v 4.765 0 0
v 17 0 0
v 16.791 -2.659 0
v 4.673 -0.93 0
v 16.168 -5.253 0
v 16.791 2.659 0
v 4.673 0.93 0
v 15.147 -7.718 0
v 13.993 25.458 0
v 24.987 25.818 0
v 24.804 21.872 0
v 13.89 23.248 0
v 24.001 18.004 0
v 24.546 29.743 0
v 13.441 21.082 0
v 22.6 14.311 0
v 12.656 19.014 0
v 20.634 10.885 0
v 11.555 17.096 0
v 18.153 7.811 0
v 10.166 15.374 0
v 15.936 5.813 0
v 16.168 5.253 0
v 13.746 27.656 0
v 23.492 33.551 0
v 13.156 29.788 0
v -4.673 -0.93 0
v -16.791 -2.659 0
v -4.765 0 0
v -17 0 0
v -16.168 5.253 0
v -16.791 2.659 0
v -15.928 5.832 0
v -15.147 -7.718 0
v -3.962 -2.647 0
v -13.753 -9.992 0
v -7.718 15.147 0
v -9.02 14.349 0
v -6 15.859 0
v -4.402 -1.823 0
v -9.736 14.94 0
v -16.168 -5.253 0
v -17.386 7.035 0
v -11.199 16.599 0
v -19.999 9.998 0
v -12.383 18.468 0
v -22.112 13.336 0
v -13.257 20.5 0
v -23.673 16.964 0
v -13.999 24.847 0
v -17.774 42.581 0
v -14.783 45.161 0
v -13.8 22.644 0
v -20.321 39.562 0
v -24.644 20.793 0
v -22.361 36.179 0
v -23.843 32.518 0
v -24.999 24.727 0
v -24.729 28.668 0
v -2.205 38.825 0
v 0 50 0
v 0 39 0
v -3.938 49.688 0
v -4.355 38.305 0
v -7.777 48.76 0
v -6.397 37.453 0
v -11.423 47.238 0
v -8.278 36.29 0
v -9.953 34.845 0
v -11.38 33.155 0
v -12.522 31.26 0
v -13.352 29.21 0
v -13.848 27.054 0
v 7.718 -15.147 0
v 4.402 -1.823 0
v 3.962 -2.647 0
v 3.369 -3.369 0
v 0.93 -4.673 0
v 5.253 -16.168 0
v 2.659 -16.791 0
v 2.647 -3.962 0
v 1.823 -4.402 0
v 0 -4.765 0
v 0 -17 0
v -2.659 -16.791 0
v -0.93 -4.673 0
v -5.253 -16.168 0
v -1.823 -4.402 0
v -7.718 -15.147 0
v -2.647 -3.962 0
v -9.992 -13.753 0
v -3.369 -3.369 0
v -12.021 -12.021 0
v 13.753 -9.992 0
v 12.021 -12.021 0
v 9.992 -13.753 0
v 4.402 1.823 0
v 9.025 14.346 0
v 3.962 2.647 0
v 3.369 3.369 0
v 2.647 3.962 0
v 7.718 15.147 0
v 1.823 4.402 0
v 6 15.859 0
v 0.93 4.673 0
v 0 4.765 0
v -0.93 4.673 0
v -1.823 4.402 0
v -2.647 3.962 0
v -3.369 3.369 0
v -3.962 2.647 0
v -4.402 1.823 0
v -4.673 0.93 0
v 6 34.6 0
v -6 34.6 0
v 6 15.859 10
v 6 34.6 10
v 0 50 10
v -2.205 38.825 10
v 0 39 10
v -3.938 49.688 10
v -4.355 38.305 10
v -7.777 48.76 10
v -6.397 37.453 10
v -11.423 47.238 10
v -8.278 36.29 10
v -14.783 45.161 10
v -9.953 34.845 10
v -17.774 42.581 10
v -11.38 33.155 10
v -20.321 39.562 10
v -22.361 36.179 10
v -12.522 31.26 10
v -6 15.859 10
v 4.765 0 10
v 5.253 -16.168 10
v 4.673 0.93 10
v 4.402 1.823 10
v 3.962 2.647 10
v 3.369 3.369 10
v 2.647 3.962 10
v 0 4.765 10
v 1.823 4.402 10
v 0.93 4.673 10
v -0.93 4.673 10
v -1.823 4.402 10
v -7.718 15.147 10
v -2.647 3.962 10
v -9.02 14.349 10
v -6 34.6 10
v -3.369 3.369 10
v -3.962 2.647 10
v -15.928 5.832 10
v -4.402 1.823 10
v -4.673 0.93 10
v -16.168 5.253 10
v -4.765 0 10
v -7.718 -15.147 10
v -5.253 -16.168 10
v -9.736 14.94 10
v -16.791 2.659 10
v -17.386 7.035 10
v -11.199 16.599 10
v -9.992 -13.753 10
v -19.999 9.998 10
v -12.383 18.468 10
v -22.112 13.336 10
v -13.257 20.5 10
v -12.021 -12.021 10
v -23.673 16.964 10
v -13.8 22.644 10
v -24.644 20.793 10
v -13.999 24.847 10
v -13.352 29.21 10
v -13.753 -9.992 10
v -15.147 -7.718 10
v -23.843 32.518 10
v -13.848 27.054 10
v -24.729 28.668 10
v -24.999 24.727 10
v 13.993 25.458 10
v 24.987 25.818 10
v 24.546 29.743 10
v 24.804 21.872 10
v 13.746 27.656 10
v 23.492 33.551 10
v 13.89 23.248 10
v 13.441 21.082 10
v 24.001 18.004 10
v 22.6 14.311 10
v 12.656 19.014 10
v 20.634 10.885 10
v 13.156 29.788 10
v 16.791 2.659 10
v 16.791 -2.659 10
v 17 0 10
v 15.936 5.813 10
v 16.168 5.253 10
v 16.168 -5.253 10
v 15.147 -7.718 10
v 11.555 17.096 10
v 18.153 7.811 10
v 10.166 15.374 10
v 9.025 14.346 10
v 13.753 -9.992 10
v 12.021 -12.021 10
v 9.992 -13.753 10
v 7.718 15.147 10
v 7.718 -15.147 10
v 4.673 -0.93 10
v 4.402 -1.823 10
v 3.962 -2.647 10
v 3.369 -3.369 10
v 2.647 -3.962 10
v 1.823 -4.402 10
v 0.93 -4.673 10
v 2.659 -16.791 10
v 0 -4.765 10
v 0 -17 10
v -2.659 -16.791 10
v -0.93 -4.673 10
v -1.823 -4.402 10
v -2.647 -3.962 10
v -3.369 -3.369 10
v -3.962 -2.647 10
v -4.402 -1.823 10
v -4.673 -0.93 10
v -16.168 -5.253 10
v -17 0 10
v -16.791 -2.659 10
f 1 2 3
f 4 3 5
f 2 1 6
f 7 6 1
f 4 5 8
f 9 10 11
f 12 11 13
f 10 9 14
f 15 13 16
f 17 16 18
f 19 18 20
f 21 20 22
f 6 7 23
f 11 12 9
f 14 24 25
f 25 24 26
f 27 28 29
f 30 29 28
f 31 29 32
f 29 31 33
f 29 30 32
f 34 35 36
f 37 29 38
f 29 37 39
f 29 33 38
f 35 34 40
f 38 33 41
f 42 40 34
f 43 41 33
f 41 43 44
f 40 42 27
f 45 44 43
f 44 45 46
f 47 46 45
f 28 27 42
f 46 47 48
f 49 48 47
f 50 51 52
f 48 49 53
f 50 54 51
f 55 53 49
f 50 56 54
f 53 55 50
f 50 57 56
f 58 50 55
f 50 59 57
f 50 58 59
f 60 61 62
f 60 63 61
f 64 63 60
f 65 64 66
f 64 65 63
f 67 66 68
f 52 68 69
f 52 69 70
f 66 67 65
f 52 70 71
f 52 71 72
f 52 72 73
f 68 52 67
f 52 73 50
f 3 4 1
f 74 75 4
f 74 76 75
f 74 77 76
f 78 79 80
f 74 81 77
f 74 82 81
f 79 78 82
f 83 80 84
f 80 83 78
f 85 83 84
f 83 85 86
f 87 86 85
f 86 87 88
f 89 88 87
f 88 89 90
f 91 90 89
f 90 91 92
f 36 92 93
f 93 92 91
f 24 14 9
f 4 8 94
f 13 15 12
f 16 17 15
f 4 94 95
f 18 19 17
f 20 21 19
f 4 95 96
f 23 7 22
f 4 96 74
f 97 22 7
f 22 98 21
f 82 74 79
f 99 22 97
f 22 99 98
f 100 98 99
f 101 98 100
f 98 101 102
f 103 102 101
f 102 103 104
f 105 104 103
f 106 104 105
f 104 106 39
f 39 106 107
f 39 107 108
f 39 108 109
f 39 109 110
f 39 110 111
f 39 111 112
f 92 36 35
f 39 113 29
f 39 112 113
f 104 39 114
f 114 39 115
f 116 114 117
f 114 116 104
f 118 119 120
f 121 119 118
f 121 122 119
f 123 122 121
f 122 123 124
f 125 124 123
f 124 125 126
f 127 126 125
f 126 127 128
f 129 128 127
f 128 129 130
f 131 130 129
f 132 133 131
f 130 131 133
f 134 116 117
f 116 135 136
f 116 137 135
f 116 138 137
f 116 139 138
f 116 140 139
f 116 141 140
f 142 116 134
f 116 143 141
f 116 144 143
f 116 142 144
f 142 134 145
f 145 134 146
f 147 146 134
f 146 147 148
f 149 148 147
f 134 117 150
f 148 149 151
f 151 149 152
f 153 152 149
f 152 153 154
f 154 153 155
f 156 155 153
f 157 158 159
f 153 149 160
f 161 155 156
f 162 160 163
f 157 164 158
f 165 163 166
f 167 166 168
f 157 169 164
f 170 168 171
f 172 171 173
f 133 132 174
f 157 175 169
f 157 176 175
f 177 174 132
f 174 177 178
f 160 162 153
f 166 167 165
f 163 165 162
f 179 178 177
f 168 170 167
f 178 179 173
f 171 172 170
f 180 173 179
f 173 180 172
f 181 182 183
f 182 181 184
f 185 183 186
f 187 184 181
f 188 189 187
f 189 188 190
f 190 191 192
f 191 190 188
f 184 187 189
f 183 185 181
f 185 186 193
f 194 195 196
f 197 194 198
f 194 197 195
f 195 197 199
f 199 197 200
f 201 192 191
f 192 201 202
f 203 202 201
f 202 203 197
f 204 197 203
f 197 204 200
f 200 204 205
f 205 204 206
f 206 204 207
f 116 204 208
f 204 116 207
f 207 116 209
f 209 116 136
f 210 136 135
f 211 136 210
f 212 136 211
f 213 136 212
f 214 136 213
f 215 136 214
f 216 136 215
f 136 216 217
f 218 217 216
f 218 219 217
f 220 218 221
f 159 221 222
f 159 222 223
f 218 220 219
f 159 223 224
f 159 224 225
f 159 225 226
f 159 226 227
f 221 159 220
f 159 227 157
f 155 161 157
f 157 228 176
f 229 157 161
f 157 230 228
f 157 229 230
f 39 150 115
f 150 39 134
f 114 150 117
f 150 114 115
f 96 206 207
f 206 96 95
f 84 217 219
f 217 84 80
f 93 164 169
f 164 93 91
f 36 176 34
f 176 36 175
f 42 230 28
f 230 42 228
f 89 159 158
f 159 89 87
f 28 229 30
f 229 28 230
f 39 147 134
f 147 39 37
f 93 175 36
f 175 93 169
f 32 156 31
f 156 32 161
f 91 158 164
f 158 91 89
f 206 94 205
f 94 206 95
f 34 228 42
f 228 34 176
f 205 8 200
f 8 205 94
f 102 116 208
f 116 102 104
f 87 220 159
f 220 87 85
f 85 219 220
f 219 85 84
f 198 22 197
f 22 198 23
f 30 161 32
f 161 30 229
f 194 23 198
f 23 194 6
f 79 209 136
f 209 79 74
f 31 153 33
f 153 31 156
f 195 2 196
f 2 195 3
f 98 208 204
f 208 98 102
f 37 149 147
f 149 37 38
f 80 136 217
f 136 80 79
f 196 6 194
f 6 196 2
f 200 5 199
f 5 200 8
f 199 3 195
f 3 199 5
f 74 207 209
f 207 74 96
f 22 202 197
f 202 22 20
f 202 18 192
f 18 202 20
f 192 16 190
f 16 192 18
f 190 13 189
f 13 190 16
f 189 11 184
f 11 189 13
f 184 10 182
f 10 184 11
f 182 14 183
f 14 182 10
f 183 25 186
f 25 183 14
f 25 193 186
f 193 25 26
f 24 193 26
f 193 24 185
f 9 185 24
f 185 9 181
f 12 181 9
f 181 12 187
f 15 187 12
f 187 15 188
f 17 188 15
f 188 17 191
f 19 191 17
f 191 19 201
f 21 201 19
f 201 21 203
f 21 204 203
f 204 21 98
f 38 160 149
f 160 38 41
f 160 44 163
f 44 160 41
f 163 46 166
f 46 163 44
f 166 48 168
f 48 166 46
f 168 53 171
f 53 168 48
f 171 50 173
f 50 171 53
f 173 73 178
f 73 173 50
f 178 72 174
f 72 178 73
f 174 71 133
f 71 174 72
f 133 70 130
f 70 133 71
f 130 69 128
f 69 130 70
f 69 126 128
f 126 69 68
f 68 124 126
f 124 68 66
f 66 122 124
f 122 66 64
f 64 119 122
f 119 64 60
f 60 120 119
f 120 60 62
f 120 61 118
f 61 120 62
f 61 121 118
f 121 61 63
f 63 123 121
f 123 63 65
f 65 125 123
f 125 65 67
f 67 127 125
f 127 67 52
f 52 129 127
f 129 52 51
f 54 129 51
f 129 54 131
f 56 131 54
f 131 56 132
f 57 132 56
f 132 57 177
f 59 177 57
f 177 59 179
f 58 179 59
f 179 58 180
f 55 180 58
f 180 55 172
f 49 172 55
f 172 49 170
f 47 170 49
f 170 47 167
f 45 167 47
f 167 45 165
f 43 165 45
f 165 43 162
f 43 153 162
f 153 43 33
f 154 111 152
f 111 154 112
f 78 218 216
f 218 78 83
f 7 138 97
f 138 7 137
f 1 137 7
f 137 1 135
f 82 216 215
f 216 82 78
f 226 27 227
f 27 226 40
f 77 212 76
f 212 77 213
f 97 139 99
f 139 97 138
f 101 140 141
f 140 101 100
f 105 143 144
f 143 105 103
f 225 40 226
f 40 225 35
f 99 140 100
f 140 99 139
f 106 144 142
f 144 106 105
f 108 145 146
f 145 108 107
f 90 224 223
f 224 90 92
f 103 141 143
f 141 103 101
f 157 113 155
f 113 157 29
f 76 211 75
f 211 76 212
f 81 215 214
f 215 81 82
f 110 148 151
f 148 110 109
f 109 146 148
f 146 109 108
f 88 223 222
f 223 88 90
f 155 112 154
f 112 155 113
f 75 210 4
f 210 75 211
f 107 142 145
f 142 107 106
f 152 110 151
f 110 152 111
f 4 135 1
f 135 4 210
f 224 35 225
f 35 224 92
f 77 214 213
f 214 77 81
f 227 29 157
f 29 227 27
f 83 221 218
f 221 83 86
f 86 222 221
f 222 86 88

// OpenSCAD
$fn = 32;

// ----------------------------------------------------------------------
// Hook: 50 mm shank into a 14 mm curl, 10 mm thick
// ----------------------------------------------------------------------

// --- parameters (mm) ---
shank_len = 50;           // shank length from the boss centre
shank_w = 12;             // shank width
boss_d = 34;              // boss diameter
bore_d = 9.53;            // boss bore
curl_in = 14;             // curl inner radius
curl_out = 25;            // curl outer radius
curl_sweep = 290;         // curl sweep angle
hook_t = 10;              // hook thickness

shank_profile = [[-6, 34.6], [6, 34.6], [6, 15], [-6, 15]];
boss_profile = [[17, 0], [16.791, 2.659], [16.168, 5.253], [15.147, 7.718], [13.753, 9.992], [12.021, 12.021], [9.992, 13.753], [7.718, 15.147], [5.253, 16.168], [2.659, 16.791], [0, 17], [-2.659, 16.791], [-5.253, 16.168], [-7.718, 15.147], [-9.992, 13.753], [-12.021, 12.021], [-13.753, 9.992], [-15.147, 7.718], [-16.168, 5.253], [-16.791, 2.659], [-17, 0], [-16.791, -2.659], [-16.168, -5.253], [-15.147, -7.718], [-13.753, -9.992], [-12.021, -12.021], [-9.992, -13.753], [-7.718, -15.147], [-5.253, -16.168], [-2.659, -16.791], [0, -17], [2.659, -16.791], [5.253, -16.168], [7.718, -15.147], [9.992, -13.753], [12.021, -12.021], [13.753, -9.992], [15.147, -7.718], [16.168, -5.253], [16.791, -2.659]];
curl_profile = [[0, 50], [-3.938, 49.688], [-7.777, 48.76], [-11.423, 47.238], [-14.783, 45.161], [-17.774, 42.581], [-20.321, 39.562], [-22.361, 36.179], [-23.843, 32.518], [-24.729, 28.668], [-24.999, 24.727], [-24.644, 20.793], [-23.673, 16.964], [-22.112, 13.336], [-19.999, 9.998], [-17.386, 7.035], [-14.339, 4.521], [-10.935, 2.518], [-7.257, 1.076], [-3.398, 0.232], [0.545, 0.006], [4.475, 0.404], [8.294, 1.416], [11.905, 3.017], [15.219, 5.166], [18.153, 7.811], [20.634, 10.885], [22.6, 14.311], [24.001, 18.004], [24.804, 21.872], [24.987, 25.818], [24.546, 29.743], [23.492, 33.551], [13.156, 29.788], [13.746, 27.656], [13.993, 25.458], [13.89, 23.248], [13.441, 21.082], [12.656, 19.014], [11.555, 17.096], [10.166, 15.374], [8.523, 13.893], [6.667, 12.689], [4.644, 11.793], [2.506, 11.226], [0.305, 11.003], [-1.903, 11.13], [-4.064, 11.603], [-6.123, 12.41], [-8.03, 13.532], [-9.736, 14.94], [-11.199, 16.599], [-12.383, 18.468], [-13.257, 20.5], [-13.8, 22.644], [-13.999, 24.847], [-13.848, 27.054], [-13.352, 29.21], [-12.522, 31.26], [-11.38, 33.155], [-9.953, 34.845], [-8.278, 36.29], [-6.397, 37.453], [-4.355, 38.305], [-2.205, 38.825], [0, 39]];

difference() {
  union() {
    /* three overlapping outlines: shank, boss and the smooth curl */
    linear_extrude(height = hook_t) polygon(shank_profile);
    linear_extrude(height = hook_t) polygon(boss_profile);
    linear_extrude(height = hook_t) polygon(curl_profile);
  }
  translate([0, 0, -2.5]) cylinder(h = hook_t + 5, d = bore_d);
}
